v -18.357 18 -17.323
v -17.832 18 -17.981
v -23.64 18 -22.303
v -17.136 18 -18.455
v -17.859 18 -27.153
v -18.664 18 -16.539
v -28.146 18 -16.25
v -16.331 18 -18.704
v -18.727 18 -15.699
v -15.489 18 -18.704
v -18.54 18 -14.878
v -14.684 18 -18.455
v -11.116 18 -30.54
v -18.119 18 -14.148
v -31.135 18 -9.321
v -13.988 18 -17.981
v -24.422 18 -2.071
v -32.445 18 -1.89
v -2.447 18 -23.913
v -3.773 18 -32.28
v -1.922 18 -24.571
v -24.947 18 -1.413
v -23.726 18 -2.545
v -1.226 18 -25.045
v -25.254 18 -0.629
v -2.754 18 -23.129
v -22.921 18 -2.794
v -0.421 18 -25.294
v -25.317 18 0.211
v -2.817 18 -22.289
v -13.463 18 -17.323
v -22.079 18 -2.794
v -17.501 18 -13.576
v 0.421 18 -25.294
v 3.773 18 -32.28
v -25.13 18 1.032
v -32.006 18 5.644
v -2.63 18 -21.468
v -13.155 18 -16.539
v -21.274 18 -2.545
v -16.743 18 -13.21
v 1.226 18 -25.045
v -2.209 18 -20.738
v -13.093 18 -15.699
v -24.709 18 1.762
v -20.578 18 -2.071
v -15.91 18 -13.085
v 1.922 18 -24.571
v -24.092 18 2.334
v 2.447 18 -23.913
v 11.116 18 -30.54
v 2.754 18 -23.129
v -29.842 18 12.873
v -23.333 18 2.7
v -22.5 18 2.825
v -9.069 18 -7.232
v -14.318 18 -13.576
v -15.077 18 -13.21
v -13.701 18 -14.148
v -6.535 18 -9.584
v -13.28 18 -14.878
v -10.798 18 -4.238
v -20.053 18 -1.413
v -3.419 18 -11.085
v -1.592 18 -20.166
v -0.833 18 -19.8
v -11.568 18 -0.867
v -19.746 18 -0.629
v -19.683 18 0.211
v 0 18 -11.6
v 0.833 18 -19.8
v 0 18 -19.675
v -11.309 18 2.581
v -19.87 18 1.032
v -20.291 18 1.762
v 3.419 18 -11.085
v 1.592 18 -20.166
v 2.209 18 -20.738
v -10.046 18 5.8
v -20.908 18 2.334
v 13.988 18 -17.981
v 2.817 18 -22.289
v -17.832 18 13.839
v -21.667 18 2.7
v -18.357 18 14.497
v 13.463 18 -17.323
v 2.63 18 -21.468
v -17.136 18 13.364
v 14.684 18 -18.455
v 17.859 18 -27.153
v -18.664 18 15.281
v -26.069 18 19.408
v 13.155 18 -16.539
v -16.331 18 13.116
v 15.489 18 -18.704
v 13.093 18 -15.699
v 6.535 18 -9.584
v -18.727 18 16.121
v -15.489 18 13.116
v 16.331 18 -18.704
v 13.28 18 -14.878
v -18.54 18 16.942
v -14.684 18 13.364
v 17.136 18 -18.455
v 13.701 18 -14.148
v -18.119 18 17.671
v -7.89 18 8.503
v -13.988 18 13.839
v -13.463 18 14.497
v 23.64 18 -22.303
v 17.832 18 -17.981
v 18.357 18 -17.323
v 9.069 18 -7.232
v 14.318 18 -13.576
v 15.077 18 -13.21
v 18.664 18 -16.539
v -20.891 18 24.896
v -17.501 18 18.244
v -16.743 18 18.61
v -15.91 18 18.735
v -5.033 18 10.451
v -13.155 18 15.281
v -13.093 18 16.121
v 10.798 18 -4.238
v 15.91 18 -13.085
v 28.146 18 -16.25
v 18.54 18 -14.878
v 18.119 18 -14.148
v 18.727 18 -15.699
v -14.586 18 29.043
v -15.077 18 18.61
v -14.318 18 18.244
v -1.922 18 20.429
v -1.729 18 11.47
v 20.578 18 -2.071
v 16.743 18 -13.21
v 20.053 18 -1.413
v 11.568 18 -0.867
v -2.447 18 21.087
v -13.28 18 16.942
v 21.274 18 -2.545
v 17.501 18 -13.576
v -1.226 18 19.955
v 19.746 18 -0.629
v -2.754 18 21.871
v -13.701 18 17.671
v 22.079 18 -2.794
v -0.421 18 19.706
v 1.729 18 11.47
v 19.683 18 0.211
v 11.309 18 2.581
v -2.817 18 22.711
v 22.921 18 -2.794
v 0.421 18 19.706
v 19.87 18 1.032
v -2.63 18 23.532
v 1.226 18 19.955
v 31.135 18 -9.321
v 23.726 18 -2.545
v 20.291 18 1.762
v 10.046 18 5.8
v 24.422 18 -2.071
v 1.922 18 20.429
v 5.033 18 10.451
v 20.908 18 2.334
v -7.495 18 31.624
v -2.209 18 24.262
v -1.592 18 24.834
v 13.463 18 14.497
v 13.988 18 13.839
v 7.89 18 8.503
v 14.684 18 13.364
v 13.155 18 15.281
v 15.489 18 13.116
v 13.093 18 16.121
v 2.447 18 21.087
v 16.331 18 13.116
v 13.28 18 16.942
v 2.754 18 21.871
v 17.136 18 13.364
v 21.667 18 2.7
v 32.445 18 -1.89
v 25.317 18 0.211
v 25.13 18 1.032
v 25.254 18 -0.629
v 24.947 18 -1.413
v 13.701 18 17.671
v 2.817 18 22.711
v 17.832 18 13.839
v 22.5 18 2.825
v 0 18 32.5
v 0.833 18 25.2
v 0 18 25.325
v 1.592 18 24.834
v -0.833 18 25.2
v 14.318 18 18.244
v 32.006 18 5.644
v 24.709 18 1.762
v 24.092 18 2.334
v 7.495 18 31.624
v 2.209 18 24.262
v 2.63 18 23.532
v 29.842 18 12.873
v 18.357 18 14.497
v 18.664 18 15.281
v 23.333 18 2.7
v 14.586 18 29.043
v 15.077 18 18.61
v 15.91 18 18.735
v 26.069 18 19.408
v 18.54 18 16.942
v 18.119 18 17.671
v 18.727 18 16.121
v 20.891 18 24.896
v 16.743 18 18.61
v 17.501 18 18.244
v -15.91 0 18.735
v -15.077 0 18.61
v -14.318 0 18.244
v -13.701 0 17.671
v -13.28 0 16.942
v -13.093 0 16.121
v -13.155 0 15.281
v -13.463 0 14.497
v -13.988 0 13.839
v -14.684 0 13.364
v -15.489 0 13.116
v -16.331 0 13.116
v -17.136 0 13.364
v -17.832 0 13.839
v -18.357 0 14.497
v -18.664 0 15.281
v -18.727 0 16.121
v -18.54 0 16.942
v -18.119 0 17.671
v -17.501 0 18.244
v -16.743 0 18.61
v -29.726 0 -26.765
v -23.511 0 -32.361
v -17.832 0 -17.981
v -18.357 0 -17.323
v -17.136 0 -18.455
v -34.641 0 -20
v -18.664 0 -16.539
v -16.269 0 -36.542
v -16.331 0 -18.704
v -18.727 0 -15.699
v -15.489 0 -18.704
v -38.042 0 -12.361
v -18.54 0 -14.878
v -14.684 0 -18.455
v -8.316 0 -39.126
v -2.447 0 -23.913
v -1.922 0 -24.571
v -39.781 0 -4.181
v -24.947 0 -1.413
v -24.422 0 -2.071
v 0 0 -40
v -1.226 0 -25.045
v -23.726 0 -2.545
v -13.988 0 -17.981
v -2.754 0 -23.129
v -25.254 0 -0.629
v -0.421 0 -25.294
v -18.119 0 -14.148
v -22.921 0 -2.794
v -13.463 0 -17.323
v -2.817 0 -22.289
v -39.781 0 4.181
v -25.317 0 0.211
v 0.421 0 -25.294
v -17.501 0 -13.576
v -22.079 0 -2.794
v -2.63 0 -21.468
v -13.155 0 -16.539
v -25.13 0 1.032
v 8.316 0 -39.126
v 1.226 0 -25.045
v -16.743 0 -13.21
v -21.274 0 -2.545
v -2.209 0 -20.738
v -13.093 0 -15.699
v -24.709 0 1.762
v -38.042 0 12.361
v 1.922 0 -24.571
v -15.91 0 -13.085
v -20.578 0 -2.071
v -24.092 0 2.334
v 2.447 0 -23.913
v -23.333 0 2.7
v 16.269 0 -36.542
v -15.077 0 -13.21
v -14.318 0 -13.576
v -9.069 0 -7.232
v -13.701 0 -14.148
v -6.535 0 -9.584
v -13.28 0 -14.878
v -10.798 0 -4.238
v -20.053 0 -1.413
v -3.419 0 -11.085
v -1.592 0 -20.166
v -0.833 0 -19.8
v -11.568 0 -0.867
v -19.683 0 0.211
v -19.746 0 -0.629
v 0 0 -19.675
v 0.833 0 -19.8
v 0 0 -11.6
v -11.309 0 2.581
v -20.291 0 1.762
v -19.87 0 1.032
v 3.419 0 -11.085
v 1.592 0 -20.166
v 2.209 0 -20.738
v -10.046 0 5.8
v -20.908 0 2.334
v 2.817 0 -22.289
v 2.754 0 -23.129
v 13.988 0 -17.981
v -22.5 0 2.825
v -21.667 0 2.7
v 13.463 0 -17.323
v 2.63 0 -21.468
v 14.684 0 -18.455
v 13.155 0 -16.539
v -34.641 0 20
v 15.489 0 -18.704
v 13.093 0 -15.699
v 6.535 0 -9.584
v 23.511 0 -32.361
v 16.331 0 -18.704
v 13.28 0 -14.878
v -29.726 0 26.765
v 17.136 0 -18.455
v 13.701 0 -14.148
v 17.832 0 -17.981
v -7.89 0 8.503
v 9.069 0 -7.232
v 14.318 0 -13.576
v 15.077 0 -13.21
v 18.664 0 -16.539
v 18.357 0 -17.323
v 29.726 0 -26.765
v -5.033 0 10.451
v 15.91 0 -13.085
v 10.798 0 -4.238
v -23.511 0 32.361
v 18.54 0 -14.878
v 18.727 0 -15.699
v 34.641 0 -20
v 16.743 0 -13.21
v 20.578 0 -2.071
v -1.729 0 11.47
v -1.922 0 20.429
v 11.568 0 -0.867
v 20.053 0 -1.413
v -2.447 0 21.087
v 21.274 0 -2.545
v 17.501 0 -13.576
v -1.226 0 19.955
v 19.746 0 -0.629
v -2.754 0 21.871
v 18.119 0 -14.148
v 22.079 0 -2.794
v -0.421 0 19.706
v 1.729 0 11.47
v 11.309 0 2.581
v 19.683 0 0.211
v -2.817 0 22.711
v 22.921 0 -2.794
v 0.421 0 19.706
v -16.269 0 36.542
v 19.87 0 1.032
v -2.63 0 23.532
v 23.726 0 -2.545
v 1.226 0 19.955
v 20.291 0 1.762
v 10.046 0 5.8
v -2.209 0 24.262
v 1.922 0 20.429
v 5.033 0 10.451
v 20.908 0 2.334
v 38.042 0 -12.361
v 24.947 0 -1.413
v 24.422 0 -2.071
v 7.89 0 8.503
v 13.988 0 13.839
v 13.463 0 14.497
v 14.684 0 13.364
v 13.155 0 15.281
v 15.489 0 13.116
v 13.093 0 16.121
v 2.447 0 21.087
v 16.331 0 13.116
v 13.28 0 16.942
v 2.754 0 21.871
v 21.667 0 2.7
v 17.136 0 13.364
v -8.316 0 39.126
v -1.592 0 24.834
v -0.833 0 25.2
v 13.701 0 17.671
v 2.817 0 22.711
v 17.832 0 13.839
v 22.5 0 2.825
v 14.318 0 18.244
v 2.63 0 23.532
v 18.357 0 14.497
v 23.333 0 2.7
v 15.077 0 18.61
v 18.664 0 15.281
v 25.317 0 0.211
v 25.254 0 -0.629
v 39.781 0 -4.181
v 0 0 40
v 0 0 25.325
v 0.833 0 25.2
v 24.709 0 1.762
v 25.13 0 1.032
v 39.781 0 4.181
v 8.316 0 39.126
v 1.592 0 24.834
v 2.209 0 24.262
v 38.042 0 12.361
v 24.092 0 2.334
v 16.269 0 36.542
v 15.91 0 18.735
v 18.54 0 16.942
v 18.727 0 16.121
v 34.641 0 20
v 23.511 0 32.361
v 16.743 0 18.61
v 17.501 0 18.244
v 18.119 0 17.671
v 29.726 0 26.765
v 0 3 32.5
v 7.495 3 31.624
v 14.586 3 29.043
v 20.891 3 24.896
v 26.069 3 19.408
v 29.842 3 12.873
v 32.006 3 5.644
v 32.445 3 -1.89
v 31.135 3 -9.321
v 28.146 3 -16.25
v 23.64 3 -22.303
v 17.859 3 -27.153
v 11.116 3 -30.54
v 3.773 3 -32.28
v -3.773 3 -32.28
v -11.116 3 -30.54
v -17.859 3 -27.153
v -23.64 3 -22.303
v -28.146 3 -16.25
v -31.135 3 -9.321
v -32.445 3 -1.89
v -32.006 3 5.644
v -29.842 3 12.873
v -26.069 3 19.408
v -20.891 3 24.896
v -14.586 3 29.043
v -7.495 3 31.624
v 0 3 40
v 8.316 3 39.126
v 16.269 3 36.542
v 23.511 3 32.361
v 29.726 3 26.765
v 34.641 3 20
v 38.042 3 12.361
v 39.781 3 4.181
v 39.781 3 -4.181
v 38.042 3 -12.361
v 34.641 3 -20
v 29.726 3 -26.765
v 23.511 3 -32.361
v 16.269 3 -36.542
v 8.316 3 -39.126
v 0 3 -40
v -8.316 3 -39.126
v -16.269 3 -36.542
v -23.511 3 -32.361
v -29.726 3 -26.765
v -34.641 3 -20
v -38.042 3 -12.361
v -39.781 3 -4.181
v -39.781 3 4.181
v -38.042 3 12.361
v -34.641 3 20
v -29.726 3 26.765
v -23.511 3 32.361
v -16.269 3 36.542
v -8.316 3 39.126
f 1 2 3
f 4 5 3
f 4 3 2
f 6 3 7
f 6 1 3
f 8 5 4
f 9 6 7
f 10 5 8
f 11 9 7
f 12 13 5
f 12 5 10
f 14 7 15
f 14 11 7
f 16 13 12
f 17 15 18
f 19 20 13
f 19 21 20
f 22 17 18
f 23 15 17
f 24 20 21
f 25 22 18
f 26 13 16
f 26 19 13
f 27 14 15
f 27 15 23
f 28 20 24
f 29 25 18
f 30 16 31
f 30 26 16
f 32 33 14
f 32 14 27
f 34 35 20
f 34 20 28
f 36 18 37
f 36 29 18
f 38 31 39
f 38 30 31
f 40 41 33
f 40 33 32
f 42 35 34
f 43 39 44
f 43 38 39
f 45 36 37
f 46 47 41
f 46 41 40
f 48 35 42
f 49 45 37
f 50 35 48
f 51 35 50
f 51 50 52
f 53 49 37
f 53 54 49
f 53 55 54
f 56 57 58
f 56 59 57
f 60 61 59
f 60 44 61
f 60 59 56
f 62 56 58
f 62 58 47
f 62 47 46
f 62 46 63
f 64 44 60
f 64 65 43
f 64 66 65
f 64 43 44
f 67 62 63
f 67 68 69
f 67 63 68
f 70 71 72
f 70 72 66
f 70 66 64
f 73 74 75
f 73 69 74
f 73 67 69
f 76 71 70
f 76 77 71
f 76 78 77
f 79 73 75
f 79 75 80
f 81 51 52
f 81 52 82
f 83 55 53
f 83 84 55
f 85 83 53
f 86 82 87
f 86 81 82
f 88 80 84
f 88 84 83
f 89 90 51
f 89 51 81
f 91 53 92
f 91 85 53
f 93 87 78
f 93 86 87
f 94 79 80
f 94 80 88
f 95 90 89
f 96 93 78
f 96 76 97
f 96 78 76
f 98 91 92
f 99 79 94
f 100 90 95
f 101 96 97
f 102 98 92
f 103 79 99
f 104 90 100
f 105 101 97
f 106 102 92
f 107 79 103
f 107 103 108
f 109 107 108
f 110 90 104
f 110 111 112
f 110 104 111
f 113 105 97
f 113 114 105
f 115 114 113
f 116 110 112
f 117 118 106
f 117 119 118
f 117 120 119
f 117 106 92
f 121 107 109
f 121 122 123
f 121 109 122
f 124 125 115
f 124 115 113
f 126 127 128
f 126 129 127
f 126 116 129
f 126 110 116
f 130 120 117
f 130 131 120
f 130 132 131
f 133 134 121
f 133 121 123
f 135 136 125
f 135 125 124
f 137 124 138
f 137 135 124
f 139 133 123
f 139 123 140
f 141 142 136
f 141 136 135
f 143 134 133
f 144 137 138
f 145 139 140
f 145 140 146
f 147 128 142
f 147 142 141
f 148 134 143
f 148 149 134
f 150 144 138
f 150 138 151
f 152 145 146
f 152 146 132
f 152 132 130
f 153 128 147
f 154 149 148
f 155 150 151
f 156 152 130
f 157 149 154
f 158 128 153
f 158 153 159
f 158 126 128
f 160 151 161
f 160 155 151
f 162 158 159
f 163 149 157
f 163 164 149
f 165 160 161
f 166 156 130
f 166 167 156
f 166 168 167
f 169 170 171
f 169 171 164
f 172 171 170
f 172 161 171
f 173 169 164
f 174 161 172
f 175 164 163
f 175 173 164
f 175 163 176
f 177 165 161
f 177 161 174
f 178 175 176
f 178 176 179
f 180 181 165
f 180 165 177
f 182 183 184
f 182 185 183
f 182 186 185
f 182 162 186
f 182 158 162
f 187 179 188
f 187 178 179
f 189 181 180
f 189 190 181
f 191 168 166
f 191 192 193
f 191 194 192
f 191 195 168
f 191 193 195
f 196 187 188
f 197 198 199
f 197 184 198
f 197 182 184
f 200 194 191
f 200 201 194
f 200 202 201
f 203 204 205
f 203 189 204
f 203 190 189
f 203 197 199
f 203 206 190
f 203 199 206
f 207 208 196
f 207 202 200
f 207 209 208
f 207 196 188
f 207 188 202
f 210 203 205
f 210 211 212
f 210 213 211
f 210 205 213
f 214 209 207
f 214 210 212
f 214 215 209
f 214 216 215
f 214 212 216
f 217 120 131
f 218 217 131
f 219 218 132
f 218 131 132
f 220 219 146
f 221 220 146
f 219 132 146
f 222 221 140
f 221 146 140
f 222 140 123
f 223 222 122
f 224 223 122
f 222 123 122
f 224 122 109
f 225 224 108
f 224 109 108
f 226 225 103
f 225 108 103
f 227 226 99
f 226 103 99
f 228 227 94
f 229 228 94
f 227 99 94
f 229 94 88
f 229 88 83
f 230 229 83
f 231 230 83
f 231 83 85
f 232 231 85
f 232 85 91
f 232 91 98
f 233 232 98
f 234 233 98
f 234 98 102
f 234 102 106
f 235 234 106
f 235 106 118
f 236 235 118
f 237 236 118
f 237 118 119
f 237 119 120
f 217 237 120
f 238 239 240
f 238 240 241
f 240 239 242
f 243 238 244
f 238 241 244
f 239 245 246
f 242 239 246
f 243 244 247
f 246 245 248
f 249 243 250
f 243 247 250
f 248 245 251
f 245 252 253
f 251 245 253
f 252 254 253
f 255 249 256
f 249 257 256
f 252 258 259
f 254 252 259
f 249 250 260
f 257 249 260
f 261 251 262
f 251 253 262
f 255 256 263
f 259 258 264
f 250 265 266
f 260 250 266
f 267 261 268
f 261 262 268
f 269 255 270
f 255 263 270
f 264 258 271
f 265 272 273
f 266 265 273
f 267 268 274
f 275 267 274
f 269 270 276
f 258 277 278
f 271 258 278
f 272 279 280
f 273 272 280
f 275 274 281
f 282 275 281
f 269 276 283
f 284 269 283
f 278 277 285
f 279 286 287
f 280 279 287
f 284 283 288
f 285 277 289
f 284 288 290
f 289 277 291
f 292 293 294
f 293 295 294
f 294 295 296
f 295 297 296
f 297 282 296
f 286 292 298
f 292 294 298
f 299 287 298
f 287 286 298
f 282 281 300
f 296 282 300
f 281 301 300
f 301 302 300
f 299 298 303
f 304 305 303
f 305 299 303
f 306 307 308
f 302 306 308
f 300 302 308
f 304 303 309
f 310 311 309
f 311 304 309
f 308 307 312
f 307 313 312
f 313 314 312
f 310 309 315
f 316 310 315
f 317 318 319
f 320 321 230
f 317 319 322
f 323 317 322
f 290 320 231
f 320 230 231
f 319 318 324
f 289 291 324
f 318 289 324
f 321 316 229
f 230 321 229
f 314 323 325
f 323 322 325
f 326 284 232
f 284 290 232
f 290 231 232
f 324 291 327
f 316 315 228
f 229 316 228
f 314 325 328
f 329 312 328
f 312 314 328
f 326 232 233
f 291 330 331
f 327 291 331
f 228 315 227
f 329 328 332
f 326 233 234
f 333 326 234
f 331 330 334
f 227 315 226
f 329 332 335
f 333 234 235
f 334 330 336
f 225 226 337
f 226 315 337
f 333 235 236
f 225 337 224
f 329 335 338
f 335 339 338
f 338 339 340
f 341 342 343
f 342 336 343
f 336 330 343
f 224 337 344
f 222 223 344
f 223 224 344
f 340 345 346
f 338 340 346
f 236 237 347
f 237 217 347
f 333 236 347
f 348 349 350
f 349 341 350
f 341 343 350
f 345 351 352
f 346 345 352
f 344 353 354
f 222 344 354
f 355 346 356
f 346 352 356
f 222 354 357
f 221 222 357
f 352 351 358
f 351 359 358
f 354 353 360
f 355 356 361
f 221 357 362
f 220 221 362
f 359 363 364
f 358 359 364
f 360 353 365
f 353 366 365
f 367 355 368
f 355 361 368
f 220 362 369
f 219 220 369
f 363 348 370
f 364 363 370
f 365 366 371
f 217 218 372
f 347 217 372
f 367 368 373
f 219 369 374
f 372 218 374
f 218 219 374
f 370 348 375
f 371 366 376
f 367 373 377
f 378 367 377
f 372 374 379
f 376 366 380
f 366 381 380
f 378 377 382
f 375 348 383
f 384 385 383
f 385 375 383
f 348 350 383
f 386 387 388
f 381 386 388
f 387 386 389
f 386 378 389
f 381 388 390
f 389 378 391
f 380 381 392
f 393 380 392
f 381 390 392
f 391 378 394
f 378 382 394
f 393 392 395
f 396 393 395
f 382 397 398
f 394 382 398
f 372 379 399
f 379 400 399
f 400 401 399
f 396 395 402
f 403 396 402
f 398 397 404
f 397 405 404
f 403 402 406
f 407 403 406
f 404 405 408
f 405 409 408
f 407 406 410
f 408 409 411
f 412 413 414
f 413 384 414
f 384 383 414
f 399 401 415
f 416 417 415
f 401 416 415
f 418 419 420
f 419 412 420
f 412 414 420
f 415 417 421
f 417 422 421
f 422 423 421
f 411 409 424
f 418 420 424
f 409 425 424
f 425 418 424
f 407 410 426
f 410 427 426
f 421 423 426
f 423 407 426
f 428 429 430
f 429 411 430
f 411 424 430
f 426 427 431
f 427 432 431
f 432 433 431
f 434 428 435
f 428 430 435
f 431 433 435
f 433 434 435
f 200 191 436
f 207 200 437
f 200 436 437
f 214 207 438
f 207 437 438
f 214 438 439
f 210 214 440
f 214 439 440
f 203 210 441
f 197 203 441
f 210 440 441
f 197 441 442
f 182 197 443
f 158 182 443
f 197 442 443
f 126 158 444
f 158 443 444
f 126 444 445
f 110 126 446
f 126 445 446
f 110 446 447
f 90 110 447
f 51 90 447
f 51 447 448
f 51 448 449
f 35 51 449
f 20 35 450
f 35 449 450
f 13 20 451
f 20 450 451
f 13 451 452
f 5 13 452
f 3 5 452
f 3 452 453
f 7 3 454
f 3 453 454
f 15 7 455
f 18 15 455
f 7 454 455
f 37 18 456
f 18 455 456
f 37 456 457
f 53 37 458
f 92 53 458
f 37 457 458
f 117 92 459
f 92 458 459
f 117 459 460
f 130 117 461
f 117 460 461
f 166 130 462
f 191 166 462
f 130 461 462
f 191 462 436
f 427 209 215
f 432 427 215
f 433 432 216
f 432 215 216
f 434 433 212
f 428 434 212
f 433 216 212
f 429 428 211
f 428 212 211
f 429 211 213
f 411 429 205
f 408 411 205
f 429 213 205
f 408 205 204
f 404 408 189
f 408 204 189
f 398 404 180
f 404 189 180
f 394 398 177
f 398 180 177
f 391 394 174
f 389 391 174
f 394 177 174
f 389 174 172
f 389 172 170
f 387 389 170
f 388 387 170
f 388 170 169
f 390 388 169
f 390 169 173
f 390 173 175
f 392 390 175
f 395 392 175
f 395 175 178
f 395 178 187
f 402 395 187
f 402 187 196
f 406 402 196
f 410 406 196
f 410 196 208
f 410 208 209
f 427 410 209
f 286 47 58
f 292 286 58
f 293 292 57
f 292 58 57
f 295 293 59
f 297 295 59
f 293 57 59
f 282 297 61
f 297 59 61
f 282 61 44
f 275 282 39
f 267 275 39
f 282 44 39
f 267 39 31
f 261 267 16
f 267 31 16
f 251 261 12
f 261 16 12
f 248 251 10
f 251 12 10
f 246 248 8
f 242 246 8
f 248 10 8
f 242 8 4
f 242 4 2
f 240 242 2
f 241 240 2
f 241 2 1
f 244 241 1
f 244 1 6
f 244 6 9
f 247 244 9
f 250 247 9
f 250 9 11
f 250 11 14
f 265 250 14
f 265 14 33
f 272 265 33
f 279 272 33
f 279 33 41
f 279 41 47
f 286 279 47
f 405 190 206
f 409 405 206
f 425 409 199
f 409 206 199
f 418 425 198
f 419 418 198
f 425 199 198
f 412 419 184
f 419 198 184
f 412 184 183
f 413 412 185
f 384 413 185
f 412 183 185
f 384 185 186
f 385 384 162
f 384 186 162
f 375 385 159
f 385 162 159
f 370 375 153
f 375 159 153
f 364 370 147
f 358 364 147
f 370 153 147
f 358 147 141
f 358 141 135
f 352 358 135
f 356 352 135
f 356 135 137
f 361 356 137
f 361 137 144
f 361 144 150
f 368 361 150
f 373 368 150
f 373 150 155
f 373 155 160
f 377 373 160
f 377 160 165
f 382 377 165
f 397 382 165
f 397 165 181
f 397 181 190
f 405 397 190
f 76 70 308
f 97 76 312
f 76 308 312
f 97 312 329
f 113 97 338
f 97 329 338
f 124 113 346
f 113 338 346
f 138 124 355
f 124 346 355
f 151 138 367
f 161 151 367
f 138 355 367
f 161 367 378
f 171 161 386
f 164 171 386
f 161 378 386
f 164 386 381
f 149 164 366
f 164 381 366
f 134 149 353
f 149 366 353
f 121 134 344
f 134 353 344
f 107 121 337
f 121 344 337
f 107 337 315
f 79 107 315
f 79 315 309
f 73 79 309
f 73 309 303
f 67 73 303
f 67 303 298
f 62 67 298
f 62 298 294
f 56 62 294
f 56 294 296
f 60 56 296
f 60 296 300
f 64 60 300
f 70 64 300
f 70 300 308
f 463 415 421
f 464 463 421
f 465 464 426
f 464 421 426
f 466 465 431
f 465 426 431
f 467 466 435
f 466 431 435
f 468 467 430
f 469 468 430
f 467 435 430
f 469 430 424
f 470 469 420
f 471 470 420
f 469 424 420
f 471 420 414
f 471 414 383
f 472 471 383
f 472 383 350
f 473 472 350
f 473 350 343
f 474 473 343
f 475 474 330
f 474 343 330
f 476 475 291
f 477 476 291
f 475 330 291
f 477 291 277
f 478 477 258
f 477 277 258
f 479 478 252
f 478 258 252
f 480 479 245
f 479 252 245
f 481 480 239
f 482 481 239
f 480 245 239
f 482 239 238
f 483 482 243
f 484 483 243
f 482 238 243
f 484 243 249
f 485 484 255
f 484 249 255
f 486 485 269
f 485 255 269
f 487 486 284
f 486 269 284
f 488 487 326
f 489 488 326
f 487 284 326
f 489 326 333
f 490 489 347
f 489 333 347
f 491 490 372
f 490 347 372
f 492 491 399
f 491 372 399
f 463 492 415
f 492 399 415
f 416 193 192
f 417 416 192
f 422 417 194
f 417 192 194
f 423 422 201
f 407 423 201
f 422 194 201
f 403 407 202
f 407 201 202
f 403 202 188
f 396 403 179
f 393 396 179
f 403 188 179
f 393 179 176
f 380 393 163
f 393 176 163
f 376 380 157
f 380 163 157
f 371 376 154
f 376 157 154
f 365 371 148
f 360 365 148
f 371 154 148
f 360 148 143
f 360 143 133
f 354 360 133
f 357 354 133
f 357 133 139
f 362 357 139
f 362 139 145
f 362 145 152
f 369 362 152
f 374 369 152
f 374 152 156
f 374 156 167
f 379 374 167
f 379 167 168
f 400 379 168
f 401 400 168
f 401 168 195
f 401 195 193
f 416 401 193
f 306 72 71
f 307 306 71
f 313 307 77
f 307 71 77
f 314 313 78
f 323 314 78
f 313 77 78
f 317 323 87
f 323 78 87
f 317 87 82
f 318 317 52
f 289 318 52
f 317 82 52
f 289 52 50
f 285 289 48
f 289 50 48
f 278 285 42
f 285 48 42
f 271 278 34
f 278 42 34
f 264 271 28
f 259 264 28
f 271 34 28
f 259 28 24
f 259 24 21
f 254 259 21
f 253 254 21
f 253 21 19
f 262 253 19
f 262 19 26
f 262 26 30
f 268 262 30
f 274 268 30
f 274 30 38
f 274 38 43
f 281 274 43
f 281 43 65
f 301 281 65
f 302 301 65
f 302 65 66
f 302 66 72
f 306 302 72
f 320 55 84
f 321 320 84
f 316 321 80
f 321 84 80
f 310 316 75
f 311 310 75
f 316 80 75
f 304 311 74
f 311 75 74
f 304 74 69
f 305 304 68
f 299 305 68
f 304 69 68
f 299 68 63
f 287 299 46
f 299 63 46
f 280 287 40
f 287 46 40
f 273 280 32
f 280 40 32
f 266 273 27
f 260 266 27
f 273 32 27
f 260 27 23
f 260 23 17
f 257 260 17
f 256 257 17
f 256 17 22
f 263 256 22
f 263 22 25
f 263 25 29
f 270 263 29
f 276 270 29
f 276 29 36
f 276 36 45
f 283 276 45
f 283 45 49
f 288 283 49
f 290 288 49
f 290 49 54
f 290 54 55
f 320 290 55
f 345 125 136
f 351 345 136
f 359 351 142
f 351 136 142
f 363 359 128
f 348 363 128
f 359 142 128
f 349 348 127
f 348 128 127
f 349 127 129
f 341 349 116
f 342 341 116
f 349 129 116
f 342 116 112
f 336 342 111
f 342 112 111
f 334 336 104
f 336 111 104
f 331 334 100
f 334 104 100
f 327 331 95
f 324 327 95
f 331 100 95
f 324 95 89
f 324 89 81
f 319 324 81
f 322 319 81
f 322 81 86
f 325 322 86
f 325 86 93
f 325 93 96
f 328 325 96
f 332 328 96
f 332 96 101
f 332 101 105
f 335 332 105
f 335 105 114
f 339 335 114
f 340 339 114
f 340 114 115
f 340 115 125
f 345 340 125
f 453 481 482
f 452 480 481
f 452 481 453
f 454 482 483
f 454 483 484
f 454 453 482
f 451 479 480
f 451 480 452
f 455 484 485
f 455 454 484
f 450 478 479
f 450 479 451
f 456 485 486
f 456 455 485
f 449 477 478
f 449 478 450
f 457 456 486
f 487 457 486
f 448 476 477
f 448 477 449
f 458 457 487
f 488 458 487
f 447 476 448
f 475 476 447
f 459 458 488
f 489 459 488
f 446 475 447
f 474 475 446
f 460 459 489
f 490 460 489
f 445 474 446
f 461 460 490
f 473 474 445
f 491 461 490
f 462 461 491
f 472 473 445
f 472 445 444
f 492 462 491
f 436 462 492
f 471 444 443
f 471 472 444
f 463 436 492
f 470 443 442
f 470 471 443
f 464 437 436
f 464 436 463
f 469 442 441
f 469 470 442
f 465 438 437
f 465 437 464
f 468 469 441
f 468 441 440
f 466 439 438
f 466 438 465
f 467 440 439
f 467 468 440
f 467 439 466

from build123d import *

# Parameters (mm, degrees)
SKETCH1_R           = 40
BOSS_EXTRUDE1_DEPTH = 3
SKETCH3_R           = 32.5
BOSS_EXTRUDE2_DEPTH = 15
SKETCH4_R           = 2.82527212
CUT_EXTRUDE1_DEPTH  = 60.363288319
SKETCH5_R           = 11.6
CUT_EXTRUDE2_DEPTH  = 60.363288319


with BuildPart() as part:
    # Sketch1 → Boss-Extrude1 (new body)
    with BuildSketch(Plane(origin=(0, 0, 0), x_dir=(1, 0, 0), z_dir=(0, 1, 0))):
        with Locations(Location((0, 0, 0), (0, 0, 270))):
            Circle(SKETCH1_R)
    extrude(amount=BOSS_EXTRUDE1_DEPTH)

    # Sketch3 → Boss-Extrude2 (add)
    with BuildSketch(Plane(origin=(0, 3, 0), x_dir=(1, 0, 0), z_dir=(0, 1, 0))):
        with Locations(Location((0, 0, 0), (0, 0, 270))):
            Circle(SKETCH3_R)
    extrude(amount=BOSS_EXTRUDE2_DEPTH)

    # Sketch4 → Cut-Extrude1 (cut, through all)
    with BuildSketch(Plane(origin=(0, 18, 0), x_dir=(1, 0, 0), z_dir=(0, 1, 0))):
        with Locations(Location((0, 22.5, 0), (0, 0, 270))):
            Circle(SKETCH4_R)
        with Locations(Location((15.909902577, 15.909902577, 0), (0, 0, 270))):
            Circle(SKETCH4_R)
        with Locations(Location((22.5, 0, 0), (0, 0, 270))):
            Circle(SKETCH4_R)
        with Locations(Location((15.909902577, -15.909902577, 0), (0, 0, 270))):
            Circle(SKETCH4_R)
        with Locations(Location((0, -22.5, 0), (0, 0, 270))):
            Circle(SKETCH4_R)
        with Locations(Location((-15.909902577, -15.909902577, 0), (0, 0, 270))):
            Circle(SKETCH4_R)
        with Locations(Location((-22.5, 0, 0), (0, 0, 270))):
            Circle(SKETCH4_R)
        with Locations(Location((-15.909902577, 15.909902577, 0), (0, 0, 270))):
            Circle(SKETCH4_R)
    extrude(amount=-CUT_EXTRUDE1_DEPTH, mode=Mode.SUBTRACT)

    # Sketch5 → Cut-Extrude2 (cut, through all)
    with BuildSketch(Plane.XZ):
        with Locations(Location((0, 0, 0), (0, 0, 270))):
            Circle(SKETCH5_R)
    extrude(amount=-CUT_EXTRUDE2_DEPTH, mode=Mode.SUBTRACT)


solid = part.part
